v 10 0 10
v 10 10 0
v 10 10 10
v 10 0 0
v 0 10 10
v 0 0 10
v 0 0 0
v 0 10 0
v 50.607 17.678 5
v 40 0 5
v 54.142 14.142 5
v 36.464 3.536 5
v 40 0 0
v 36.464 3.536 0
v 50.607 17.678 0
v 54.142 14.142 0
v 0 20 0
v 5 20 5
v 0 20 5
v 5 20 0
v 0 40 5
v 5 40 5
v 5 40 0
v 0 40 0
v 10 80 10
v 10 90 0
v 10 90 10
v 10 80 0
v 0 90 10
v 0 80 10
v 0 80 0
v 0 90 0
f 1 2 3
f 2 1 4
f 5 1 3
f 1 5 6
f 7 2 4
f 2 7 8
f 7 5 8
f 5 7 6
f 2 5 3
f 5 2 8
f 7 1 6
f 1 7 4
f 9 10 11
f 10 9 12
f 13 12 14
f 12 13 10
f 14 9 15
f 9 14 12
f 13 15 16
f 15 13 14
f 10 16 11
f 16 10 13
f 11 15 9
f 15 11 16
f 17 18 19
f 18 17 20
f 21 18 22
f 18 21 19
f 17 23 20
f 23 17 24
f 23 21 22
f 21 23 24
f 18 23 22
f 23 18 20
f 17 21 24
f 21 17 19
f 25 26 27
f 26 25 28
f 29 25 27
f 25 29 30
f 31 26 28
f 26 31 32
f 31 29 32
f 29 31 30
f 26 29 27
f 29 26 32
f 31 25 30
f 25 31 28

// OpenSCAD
// The SCALAR form of all three transforms, which the corpus never wrote — every
// transform case in it passes a vector.
//
// WHAT IT WOULD CATCH. The three scalars mean three different things, and only
// one of them is "expand it to a vec3":
//   · `translate(5)` is a **no-op**. OpenSCAD cannot convert a scalar to a vec3
//     or vec2, warns, and emits the IDENTITY with the children kept. Expanding
//     it — the obvious thing to do, and what a shared `vec3()` helper does —
//     displaces the part diagonally on all three axes from a line the reference
//     implementation ignores.
//   · `rotate(45)` is a rotation about **Z**.
//   · `scale(2)` is **uniform** on all three axes.
// A single helper cannot serve all three, and the corpus could not tell.
//
// WHY IT WAS CHOSEN, WITH THE COUNT. `hardware/cad/` writes the scalar forms
// ~20 times — `rotate(90)`, `rotate(-90)`, `rotate(180)`, `rotate(30)`,
// `scale(.1)`, `scale(.8)` — and the corpus exercised none of them.
//
// ⚠ THE THIRD CHILD IS A SCALAR AT A QUADRANT MULTIPLE, deliberately.
// `xform_rotate_quadrant` pins exact-90 rotation through the VECTOR form only;
// `rotate(-90)` reaches the same degree trigonometry down a different branch of
// `grouping()`, and a scalar path that built its own matrix would keep the
// `6.12323e-17` that case exists to forbid.
//
// ⚠ AND THE FIRST CHILD IS A REFUSAL THAT KEEPS ITS GEOMETRY AND IS CORRECT —
// the only case in this corpus of that shape. `translate(scalar)` is named in
// the refusal list and the subtree is still drawn, unmoved, because that is what
// OpenSCAD does. The row reads `SAME` with a refusal printed in it; that is not
// a contradiction and should not be "cleaned up".
//
// Decidability: after rotation the four solids occupy x[0,10]y[0,10],
// x[36.5,54.1]y[0,17.7], x[0,5]y[20,40] and x[0,10]y[80,90]. No two touch.
//
// PLANTED AND WATCHED RED (throwaway copy, openscad 2026.08.07):
//   · `translate(scalar)` expanded to [5,5,5]   -> DIVERGES
//   · `rotate(scalar)` applied about X not Z    -> DIVERGES
translate(5) cube([10, 10, 10]);
translate([40, 0, 0]) rotate(45) cube([20, 5, 5]);
translate([0, 40, 0]) rotate(-90) cube([20, 5, 5]);
translate([0, 80, 0]) scale(2) cube([5, 5, 5]);
